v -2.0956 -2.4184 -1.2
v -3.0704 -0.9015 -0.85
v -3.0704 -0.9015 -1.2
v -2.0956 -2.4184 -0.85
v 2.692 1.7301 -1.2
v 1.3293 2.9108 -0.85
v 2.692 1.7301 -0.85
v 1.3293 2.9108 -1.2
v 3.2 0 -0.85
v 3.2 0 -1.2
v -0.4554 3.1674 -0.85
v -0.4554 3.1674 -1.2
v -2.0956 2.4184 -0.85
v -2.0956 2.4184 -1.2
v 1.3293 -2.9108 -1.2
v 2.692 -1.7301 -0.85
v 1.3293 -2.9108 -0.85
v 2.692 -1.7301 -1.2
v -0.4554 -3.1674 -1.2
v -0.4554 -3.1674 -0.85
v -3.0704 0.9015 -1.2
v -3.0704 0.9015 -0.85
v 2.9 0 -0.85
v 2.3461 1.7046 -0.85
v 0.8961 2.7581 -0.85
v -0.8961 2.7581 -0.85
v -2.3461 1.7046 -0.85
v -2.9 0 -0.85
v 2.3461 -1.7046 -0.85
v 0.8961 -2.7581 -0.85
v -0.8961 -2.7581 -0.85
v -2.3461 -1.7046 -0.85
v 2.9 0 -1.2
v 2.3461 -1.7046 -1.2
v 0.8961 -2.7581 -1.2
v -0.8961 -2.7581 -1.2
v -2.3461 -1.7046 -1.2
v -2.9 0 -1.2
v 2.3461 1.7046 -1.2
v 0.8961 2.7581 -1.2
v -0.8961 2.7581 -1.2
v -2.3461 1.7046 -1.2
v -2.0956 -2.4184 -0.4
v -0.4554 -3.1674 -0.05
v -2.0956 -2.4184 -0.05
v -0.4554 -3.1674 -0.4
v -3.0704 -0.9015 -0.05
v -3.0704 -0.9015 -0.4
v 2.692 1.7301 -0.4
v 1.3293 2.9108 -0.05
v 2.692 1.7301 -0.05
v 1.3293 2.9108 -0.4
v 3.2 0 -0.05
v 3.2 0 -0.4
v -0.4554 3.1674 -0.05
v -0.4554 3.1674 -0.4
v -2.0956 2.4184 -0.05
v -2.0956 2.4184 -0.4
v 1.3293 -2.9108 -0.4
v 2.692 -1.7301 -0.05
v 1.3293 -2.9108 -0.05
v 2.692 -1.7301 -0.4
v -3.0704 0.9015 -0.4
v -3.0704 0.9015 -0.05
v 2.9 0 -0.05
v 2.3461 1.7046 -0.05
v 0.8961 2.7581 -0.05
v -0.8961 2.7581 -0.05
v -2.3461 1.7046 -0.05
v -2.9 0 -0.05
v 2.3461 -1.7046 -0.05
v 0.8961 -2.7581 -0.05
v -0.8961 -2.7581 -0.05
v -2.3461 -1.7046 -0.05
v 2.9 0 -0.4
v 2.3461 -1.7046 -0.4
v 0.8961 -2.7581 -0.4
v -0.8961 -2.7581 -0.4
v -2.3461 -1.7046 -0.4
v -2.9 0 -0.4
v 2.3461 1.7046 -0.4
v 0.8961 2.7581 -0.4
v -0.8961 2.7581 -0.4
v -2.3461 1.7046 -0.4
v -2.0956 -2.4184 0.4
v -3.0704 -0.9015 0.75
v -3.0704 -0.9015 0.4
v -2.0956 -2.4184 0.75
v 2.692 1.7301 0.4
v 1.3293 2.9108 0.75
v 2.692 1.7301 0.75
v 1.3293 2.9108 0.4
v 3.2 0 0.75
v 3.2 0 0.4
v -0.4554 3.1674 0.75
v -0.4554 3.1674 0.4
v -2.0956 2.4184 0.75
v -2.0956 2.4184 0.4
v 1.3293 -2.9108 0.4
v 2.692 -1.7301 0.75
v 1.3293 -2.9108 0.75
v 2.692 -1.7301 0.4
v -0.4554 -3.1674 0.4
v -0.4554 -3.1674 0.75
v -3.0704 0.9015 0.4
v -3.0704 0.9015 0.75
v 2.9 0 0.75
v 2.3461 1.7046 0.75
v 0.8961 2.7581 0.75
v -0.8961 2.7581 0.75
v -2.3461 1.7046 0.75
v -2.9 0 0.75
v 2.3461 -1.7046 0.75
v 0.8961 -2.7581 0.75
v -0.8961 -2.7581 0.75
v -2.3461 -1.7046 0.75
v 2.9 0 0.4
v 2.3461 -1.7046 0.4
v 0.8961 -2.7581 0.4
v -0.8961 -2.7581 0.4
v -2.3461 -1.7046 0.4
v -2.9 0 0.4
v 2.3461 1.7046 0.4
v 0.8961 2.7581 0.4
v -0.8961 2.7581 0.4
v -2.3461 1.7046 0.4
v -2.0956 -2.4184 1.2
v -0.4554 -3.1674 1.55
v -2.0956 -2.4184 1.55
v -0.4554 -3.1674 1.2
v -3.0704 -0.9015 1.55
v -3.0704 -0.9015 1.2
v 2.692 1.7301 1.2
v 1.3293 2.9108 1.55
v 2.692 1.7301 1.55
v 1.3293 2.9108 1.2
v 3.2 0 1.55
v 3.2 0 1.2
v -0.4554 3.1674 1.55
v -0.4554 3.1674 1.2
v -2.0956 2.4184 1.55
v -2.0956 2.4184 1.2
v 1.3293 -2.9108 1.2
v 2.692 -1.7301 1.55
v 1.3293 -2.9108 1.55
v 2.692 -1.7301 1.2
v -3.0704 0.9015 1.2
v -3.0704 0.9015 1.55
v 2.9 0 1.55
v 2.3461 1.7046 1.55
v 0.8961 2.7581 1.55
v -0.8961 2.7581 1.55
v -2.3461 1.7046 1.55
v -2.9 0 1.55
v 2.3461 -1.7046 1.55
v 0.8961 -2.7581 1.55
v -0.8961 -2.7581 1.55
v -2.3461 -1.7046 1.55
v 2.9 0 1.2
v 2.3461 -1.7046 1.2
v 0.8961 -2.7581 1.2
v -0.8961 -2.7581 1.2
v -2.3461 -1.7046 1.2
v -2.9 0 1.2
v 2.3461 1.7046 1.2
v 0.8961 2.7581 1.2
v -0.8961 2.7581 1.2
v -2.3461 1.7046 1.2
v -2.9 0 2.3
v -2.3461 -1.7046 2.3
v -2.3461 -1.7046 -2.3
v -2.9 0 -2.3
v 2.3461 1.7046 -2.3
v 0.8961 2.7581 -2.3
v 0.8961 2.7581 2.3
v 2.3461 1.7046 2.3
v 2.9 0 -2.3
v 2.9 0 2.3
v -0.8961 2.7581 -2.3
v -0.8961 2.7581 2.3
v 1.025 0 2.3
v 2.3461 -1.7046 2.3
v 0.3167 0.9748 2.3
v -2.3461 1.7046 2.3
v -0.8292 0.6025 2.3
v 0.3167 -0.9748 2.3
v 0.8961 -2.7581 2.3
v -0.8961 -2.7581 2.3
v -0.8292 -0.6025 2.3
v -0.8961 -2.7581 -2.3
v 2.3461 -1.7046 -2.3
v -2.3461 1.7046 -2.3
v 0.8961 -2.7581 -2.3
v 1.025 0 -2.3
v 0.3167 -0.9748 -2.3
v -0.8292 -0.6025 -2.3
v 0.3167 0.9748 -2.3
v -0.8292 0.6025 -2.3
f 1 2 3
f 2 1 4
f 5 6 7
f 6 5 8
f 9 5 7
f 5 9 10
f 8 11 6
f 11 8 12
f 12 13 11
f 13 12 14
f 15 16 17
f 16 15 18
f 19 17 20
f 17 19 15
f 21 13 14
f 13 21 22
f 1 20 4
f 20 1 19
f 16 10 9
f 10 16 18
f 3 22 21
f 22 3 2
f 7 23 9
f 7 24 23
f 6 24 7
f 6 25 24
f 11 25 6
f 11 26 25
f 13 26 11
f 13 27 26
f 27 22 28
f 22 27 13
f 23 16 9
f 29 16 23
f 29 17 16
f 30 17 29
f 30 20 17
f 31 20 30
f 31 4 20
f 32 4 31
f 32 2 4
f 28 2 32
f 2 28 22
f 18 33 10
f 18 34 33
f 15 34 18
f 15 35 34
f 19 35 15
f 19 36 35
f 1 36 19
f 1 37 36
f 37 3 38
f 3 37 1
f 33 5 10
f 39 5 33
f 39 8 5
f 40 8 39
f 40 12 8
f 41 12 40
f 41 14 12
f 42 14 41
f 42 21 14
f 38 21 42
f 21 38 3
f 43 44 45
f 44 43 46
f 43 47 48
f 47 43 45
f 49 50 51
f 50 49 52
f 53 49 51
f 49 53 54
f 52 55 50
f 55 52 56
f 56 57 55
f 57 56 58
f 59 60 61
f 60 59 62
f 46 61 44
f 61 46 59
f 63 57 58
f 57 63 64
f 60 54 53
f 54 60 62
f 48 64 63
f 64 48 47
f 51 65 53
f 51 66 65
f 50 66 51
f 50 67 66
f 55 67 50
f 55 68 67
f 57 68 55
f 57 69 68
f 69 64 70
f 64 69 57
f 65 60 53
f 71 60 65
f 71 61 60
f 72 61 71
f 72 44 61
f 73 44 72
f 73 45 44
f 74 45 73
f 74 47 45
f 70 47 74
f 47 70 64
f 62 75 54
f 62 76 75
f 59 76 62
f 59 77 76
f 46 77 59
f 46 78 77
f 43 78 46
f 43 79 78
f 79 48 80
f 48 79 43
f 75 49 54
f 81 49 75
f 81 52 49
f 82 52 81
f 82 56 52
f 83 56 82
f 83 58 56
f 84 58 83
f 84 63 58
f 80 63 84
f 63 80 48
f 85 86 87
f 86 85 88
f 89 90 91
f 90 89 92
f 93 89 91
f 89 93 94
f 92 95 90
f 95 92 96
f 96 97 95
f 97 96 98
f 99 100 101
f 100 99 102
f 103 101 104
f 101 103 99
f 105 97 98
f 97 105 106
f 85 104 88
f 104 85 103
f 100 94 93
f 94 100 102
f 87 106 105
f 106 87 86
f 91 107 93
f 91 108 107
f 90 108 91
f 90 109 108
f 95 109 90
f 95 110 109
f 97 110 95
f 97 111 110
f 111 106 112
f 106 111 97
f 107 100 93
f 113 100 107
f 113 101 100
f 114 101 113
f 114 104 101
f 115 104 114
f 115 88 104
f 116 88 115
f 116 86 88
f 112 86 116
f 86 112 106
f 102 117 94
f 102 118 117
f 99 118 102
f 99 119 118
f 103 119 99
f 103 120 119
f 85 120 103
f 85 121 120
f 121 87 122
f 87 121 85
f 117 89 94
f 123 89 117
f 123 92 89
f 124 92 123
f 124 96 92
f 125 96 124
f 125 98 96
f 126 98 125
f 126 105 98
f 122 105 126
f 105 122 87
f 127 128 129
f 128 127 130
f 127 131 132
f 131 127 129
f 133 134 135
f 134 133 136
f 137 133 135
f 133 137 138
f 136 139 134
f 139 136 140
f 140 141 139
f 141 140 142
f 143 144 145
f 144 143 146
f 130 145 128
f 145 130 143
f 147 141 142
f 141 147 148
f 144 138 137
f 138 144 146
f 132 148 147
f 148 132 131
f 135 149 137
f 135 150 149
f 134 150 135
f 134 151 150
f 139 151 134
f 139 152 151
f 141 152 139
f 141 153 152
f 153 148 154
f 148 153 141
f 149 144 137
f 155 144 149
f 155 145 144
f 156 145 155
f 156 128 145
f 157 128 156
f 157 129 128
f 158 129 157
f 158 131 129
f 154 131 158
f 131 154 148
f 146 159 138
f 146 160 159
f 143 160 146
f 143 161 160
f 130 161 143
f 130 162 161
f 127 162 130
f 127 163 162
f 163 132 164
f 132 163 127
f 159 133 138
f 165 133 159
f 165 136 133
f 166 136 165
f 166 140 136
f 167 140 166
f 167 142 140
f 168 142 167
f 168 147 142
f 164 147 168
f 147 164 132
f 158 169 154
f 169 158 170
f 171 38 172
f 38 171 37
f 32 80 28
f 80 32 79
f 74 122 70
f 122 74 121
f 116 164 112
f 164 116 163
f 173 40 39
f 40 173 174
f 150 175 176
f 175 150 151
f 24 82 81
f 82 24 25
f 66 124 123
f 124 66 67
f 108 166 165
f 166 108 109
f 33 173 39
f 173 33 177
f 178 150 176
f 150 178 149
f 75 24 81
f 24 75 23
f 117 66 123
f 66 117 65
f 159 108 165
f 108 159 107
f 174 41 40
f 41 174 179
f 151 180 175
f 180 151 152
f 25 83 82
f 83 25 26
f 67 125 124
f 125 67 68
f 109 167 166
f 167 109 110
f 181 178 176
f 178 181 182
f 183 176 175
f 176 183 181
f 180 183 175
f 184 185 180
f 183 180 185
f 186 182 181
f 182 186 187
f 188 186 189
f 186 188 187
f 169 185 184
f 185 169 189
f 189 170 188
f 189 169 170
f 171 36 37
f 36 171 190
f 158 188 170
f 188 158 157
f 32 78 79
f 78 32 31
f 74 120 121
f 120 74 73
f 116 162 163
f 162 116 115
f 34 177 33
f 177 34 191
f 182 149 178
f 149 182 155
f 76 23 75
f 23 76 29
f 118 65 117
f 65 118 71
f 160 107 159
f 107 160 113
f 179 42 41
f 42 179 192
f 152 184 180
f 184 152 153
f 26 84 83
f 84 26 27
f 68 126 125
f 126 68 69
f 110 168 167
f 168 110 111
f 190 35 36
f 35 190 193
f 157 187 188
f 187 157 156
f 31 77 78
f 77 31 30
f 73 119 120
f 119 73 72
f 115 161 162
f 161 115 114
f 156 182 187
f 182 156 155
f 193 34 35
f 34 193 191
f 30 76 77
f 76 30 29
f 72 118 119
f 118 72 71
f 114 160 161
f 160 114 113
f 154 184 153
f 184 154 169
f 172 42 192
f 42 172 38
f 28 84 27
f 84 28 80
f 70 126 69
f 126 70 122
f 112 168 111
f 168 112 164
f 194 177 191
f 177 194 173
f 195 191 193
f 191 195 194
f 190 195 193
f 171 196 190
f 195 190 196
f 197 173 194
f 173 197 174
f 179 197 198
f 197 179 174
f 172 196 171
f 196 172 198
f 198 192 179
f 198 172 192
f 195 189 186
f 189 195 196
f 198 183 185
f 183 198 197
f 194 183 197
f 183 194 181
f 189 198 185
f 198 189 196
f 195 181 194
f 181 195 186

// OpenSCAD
// Parameters
outer_diameter = 5.8; //[2.9:11.6:0.1]
length = 4.6; //[2.3:9.2:0.1]
screw_diameter = 2.5; //[1.25:5:0.05]
bore_minor_diameter = 2.05; //[1.0:4.1:0.05]
bore_major_diameter = 2.5; //[1.25:5:0.05]
end_chamfer_height = 0.3; //[0.15:0.6:0.05]
end_chamfer_angle_deg = 30; //[15:60:1]
lead_in_chamfer_height = 0.3; //[0.15:0.6:0.05]
lead_in_chamfer_angle_deg = 30; //[15:60:1]
knurl_depth = 0.3; //[0.15:0.6:0.05]
knurl_pitch = 0.8; //[0.4:1.6:0.05]
knurl_ring_height = 0.35; //[0.2:0.7:0.05]
knurl_count = 4; //[2:10:1]
overlap = 0.8; //[0.5:2:0.1]
bore_extra = 0.4; //[0.2:1.0:0.05]

// Threaded Insert - complete geometry
module threaded_insert() {
  color("Gold") {
    // Main body
    difference() {
      union() {
        // Insert body
        cylinder(h=length, r=outer_diameter/2, center=true);
        
        // External knurl/barbs
        for (i = [0:knurl_count-1]) {
          translate([0, 0, -length/2 + end_chamfer_height + knurl_ring_height/2 + overlap + i*knurl_pitch])
            cylinder(h=knurl_ring_height, r=outer_diameter/2 + knurl_depth, center=true);
        }
        
        // Lead-in chamfer
        translate([0, 0, length/2 - lead_in_chamfer_height/2])
          cylinder(h=lead_in_chamfer_height, r1=outer_diameter/2, r2=outer_diameter/2 - lead_in_chamfer_height, center=true);
        
        // Installation end chamfer
        translate([0, 0, -length/2 + end_chamfer_height/2])
          cylinder(h=end_chamfer_height, r1=outer_diameter/2 - end_chamfer_height, r2=outer_diameter/2, center=true);
      }
      
      // Internal thread bore
      cylinder(h=length + 2*bore_extra, r=bore_minor_diameter/2, center=true);
    }
  }
}

// Assembly
module assembly() {
  threaded_insert();
}

assembly();
